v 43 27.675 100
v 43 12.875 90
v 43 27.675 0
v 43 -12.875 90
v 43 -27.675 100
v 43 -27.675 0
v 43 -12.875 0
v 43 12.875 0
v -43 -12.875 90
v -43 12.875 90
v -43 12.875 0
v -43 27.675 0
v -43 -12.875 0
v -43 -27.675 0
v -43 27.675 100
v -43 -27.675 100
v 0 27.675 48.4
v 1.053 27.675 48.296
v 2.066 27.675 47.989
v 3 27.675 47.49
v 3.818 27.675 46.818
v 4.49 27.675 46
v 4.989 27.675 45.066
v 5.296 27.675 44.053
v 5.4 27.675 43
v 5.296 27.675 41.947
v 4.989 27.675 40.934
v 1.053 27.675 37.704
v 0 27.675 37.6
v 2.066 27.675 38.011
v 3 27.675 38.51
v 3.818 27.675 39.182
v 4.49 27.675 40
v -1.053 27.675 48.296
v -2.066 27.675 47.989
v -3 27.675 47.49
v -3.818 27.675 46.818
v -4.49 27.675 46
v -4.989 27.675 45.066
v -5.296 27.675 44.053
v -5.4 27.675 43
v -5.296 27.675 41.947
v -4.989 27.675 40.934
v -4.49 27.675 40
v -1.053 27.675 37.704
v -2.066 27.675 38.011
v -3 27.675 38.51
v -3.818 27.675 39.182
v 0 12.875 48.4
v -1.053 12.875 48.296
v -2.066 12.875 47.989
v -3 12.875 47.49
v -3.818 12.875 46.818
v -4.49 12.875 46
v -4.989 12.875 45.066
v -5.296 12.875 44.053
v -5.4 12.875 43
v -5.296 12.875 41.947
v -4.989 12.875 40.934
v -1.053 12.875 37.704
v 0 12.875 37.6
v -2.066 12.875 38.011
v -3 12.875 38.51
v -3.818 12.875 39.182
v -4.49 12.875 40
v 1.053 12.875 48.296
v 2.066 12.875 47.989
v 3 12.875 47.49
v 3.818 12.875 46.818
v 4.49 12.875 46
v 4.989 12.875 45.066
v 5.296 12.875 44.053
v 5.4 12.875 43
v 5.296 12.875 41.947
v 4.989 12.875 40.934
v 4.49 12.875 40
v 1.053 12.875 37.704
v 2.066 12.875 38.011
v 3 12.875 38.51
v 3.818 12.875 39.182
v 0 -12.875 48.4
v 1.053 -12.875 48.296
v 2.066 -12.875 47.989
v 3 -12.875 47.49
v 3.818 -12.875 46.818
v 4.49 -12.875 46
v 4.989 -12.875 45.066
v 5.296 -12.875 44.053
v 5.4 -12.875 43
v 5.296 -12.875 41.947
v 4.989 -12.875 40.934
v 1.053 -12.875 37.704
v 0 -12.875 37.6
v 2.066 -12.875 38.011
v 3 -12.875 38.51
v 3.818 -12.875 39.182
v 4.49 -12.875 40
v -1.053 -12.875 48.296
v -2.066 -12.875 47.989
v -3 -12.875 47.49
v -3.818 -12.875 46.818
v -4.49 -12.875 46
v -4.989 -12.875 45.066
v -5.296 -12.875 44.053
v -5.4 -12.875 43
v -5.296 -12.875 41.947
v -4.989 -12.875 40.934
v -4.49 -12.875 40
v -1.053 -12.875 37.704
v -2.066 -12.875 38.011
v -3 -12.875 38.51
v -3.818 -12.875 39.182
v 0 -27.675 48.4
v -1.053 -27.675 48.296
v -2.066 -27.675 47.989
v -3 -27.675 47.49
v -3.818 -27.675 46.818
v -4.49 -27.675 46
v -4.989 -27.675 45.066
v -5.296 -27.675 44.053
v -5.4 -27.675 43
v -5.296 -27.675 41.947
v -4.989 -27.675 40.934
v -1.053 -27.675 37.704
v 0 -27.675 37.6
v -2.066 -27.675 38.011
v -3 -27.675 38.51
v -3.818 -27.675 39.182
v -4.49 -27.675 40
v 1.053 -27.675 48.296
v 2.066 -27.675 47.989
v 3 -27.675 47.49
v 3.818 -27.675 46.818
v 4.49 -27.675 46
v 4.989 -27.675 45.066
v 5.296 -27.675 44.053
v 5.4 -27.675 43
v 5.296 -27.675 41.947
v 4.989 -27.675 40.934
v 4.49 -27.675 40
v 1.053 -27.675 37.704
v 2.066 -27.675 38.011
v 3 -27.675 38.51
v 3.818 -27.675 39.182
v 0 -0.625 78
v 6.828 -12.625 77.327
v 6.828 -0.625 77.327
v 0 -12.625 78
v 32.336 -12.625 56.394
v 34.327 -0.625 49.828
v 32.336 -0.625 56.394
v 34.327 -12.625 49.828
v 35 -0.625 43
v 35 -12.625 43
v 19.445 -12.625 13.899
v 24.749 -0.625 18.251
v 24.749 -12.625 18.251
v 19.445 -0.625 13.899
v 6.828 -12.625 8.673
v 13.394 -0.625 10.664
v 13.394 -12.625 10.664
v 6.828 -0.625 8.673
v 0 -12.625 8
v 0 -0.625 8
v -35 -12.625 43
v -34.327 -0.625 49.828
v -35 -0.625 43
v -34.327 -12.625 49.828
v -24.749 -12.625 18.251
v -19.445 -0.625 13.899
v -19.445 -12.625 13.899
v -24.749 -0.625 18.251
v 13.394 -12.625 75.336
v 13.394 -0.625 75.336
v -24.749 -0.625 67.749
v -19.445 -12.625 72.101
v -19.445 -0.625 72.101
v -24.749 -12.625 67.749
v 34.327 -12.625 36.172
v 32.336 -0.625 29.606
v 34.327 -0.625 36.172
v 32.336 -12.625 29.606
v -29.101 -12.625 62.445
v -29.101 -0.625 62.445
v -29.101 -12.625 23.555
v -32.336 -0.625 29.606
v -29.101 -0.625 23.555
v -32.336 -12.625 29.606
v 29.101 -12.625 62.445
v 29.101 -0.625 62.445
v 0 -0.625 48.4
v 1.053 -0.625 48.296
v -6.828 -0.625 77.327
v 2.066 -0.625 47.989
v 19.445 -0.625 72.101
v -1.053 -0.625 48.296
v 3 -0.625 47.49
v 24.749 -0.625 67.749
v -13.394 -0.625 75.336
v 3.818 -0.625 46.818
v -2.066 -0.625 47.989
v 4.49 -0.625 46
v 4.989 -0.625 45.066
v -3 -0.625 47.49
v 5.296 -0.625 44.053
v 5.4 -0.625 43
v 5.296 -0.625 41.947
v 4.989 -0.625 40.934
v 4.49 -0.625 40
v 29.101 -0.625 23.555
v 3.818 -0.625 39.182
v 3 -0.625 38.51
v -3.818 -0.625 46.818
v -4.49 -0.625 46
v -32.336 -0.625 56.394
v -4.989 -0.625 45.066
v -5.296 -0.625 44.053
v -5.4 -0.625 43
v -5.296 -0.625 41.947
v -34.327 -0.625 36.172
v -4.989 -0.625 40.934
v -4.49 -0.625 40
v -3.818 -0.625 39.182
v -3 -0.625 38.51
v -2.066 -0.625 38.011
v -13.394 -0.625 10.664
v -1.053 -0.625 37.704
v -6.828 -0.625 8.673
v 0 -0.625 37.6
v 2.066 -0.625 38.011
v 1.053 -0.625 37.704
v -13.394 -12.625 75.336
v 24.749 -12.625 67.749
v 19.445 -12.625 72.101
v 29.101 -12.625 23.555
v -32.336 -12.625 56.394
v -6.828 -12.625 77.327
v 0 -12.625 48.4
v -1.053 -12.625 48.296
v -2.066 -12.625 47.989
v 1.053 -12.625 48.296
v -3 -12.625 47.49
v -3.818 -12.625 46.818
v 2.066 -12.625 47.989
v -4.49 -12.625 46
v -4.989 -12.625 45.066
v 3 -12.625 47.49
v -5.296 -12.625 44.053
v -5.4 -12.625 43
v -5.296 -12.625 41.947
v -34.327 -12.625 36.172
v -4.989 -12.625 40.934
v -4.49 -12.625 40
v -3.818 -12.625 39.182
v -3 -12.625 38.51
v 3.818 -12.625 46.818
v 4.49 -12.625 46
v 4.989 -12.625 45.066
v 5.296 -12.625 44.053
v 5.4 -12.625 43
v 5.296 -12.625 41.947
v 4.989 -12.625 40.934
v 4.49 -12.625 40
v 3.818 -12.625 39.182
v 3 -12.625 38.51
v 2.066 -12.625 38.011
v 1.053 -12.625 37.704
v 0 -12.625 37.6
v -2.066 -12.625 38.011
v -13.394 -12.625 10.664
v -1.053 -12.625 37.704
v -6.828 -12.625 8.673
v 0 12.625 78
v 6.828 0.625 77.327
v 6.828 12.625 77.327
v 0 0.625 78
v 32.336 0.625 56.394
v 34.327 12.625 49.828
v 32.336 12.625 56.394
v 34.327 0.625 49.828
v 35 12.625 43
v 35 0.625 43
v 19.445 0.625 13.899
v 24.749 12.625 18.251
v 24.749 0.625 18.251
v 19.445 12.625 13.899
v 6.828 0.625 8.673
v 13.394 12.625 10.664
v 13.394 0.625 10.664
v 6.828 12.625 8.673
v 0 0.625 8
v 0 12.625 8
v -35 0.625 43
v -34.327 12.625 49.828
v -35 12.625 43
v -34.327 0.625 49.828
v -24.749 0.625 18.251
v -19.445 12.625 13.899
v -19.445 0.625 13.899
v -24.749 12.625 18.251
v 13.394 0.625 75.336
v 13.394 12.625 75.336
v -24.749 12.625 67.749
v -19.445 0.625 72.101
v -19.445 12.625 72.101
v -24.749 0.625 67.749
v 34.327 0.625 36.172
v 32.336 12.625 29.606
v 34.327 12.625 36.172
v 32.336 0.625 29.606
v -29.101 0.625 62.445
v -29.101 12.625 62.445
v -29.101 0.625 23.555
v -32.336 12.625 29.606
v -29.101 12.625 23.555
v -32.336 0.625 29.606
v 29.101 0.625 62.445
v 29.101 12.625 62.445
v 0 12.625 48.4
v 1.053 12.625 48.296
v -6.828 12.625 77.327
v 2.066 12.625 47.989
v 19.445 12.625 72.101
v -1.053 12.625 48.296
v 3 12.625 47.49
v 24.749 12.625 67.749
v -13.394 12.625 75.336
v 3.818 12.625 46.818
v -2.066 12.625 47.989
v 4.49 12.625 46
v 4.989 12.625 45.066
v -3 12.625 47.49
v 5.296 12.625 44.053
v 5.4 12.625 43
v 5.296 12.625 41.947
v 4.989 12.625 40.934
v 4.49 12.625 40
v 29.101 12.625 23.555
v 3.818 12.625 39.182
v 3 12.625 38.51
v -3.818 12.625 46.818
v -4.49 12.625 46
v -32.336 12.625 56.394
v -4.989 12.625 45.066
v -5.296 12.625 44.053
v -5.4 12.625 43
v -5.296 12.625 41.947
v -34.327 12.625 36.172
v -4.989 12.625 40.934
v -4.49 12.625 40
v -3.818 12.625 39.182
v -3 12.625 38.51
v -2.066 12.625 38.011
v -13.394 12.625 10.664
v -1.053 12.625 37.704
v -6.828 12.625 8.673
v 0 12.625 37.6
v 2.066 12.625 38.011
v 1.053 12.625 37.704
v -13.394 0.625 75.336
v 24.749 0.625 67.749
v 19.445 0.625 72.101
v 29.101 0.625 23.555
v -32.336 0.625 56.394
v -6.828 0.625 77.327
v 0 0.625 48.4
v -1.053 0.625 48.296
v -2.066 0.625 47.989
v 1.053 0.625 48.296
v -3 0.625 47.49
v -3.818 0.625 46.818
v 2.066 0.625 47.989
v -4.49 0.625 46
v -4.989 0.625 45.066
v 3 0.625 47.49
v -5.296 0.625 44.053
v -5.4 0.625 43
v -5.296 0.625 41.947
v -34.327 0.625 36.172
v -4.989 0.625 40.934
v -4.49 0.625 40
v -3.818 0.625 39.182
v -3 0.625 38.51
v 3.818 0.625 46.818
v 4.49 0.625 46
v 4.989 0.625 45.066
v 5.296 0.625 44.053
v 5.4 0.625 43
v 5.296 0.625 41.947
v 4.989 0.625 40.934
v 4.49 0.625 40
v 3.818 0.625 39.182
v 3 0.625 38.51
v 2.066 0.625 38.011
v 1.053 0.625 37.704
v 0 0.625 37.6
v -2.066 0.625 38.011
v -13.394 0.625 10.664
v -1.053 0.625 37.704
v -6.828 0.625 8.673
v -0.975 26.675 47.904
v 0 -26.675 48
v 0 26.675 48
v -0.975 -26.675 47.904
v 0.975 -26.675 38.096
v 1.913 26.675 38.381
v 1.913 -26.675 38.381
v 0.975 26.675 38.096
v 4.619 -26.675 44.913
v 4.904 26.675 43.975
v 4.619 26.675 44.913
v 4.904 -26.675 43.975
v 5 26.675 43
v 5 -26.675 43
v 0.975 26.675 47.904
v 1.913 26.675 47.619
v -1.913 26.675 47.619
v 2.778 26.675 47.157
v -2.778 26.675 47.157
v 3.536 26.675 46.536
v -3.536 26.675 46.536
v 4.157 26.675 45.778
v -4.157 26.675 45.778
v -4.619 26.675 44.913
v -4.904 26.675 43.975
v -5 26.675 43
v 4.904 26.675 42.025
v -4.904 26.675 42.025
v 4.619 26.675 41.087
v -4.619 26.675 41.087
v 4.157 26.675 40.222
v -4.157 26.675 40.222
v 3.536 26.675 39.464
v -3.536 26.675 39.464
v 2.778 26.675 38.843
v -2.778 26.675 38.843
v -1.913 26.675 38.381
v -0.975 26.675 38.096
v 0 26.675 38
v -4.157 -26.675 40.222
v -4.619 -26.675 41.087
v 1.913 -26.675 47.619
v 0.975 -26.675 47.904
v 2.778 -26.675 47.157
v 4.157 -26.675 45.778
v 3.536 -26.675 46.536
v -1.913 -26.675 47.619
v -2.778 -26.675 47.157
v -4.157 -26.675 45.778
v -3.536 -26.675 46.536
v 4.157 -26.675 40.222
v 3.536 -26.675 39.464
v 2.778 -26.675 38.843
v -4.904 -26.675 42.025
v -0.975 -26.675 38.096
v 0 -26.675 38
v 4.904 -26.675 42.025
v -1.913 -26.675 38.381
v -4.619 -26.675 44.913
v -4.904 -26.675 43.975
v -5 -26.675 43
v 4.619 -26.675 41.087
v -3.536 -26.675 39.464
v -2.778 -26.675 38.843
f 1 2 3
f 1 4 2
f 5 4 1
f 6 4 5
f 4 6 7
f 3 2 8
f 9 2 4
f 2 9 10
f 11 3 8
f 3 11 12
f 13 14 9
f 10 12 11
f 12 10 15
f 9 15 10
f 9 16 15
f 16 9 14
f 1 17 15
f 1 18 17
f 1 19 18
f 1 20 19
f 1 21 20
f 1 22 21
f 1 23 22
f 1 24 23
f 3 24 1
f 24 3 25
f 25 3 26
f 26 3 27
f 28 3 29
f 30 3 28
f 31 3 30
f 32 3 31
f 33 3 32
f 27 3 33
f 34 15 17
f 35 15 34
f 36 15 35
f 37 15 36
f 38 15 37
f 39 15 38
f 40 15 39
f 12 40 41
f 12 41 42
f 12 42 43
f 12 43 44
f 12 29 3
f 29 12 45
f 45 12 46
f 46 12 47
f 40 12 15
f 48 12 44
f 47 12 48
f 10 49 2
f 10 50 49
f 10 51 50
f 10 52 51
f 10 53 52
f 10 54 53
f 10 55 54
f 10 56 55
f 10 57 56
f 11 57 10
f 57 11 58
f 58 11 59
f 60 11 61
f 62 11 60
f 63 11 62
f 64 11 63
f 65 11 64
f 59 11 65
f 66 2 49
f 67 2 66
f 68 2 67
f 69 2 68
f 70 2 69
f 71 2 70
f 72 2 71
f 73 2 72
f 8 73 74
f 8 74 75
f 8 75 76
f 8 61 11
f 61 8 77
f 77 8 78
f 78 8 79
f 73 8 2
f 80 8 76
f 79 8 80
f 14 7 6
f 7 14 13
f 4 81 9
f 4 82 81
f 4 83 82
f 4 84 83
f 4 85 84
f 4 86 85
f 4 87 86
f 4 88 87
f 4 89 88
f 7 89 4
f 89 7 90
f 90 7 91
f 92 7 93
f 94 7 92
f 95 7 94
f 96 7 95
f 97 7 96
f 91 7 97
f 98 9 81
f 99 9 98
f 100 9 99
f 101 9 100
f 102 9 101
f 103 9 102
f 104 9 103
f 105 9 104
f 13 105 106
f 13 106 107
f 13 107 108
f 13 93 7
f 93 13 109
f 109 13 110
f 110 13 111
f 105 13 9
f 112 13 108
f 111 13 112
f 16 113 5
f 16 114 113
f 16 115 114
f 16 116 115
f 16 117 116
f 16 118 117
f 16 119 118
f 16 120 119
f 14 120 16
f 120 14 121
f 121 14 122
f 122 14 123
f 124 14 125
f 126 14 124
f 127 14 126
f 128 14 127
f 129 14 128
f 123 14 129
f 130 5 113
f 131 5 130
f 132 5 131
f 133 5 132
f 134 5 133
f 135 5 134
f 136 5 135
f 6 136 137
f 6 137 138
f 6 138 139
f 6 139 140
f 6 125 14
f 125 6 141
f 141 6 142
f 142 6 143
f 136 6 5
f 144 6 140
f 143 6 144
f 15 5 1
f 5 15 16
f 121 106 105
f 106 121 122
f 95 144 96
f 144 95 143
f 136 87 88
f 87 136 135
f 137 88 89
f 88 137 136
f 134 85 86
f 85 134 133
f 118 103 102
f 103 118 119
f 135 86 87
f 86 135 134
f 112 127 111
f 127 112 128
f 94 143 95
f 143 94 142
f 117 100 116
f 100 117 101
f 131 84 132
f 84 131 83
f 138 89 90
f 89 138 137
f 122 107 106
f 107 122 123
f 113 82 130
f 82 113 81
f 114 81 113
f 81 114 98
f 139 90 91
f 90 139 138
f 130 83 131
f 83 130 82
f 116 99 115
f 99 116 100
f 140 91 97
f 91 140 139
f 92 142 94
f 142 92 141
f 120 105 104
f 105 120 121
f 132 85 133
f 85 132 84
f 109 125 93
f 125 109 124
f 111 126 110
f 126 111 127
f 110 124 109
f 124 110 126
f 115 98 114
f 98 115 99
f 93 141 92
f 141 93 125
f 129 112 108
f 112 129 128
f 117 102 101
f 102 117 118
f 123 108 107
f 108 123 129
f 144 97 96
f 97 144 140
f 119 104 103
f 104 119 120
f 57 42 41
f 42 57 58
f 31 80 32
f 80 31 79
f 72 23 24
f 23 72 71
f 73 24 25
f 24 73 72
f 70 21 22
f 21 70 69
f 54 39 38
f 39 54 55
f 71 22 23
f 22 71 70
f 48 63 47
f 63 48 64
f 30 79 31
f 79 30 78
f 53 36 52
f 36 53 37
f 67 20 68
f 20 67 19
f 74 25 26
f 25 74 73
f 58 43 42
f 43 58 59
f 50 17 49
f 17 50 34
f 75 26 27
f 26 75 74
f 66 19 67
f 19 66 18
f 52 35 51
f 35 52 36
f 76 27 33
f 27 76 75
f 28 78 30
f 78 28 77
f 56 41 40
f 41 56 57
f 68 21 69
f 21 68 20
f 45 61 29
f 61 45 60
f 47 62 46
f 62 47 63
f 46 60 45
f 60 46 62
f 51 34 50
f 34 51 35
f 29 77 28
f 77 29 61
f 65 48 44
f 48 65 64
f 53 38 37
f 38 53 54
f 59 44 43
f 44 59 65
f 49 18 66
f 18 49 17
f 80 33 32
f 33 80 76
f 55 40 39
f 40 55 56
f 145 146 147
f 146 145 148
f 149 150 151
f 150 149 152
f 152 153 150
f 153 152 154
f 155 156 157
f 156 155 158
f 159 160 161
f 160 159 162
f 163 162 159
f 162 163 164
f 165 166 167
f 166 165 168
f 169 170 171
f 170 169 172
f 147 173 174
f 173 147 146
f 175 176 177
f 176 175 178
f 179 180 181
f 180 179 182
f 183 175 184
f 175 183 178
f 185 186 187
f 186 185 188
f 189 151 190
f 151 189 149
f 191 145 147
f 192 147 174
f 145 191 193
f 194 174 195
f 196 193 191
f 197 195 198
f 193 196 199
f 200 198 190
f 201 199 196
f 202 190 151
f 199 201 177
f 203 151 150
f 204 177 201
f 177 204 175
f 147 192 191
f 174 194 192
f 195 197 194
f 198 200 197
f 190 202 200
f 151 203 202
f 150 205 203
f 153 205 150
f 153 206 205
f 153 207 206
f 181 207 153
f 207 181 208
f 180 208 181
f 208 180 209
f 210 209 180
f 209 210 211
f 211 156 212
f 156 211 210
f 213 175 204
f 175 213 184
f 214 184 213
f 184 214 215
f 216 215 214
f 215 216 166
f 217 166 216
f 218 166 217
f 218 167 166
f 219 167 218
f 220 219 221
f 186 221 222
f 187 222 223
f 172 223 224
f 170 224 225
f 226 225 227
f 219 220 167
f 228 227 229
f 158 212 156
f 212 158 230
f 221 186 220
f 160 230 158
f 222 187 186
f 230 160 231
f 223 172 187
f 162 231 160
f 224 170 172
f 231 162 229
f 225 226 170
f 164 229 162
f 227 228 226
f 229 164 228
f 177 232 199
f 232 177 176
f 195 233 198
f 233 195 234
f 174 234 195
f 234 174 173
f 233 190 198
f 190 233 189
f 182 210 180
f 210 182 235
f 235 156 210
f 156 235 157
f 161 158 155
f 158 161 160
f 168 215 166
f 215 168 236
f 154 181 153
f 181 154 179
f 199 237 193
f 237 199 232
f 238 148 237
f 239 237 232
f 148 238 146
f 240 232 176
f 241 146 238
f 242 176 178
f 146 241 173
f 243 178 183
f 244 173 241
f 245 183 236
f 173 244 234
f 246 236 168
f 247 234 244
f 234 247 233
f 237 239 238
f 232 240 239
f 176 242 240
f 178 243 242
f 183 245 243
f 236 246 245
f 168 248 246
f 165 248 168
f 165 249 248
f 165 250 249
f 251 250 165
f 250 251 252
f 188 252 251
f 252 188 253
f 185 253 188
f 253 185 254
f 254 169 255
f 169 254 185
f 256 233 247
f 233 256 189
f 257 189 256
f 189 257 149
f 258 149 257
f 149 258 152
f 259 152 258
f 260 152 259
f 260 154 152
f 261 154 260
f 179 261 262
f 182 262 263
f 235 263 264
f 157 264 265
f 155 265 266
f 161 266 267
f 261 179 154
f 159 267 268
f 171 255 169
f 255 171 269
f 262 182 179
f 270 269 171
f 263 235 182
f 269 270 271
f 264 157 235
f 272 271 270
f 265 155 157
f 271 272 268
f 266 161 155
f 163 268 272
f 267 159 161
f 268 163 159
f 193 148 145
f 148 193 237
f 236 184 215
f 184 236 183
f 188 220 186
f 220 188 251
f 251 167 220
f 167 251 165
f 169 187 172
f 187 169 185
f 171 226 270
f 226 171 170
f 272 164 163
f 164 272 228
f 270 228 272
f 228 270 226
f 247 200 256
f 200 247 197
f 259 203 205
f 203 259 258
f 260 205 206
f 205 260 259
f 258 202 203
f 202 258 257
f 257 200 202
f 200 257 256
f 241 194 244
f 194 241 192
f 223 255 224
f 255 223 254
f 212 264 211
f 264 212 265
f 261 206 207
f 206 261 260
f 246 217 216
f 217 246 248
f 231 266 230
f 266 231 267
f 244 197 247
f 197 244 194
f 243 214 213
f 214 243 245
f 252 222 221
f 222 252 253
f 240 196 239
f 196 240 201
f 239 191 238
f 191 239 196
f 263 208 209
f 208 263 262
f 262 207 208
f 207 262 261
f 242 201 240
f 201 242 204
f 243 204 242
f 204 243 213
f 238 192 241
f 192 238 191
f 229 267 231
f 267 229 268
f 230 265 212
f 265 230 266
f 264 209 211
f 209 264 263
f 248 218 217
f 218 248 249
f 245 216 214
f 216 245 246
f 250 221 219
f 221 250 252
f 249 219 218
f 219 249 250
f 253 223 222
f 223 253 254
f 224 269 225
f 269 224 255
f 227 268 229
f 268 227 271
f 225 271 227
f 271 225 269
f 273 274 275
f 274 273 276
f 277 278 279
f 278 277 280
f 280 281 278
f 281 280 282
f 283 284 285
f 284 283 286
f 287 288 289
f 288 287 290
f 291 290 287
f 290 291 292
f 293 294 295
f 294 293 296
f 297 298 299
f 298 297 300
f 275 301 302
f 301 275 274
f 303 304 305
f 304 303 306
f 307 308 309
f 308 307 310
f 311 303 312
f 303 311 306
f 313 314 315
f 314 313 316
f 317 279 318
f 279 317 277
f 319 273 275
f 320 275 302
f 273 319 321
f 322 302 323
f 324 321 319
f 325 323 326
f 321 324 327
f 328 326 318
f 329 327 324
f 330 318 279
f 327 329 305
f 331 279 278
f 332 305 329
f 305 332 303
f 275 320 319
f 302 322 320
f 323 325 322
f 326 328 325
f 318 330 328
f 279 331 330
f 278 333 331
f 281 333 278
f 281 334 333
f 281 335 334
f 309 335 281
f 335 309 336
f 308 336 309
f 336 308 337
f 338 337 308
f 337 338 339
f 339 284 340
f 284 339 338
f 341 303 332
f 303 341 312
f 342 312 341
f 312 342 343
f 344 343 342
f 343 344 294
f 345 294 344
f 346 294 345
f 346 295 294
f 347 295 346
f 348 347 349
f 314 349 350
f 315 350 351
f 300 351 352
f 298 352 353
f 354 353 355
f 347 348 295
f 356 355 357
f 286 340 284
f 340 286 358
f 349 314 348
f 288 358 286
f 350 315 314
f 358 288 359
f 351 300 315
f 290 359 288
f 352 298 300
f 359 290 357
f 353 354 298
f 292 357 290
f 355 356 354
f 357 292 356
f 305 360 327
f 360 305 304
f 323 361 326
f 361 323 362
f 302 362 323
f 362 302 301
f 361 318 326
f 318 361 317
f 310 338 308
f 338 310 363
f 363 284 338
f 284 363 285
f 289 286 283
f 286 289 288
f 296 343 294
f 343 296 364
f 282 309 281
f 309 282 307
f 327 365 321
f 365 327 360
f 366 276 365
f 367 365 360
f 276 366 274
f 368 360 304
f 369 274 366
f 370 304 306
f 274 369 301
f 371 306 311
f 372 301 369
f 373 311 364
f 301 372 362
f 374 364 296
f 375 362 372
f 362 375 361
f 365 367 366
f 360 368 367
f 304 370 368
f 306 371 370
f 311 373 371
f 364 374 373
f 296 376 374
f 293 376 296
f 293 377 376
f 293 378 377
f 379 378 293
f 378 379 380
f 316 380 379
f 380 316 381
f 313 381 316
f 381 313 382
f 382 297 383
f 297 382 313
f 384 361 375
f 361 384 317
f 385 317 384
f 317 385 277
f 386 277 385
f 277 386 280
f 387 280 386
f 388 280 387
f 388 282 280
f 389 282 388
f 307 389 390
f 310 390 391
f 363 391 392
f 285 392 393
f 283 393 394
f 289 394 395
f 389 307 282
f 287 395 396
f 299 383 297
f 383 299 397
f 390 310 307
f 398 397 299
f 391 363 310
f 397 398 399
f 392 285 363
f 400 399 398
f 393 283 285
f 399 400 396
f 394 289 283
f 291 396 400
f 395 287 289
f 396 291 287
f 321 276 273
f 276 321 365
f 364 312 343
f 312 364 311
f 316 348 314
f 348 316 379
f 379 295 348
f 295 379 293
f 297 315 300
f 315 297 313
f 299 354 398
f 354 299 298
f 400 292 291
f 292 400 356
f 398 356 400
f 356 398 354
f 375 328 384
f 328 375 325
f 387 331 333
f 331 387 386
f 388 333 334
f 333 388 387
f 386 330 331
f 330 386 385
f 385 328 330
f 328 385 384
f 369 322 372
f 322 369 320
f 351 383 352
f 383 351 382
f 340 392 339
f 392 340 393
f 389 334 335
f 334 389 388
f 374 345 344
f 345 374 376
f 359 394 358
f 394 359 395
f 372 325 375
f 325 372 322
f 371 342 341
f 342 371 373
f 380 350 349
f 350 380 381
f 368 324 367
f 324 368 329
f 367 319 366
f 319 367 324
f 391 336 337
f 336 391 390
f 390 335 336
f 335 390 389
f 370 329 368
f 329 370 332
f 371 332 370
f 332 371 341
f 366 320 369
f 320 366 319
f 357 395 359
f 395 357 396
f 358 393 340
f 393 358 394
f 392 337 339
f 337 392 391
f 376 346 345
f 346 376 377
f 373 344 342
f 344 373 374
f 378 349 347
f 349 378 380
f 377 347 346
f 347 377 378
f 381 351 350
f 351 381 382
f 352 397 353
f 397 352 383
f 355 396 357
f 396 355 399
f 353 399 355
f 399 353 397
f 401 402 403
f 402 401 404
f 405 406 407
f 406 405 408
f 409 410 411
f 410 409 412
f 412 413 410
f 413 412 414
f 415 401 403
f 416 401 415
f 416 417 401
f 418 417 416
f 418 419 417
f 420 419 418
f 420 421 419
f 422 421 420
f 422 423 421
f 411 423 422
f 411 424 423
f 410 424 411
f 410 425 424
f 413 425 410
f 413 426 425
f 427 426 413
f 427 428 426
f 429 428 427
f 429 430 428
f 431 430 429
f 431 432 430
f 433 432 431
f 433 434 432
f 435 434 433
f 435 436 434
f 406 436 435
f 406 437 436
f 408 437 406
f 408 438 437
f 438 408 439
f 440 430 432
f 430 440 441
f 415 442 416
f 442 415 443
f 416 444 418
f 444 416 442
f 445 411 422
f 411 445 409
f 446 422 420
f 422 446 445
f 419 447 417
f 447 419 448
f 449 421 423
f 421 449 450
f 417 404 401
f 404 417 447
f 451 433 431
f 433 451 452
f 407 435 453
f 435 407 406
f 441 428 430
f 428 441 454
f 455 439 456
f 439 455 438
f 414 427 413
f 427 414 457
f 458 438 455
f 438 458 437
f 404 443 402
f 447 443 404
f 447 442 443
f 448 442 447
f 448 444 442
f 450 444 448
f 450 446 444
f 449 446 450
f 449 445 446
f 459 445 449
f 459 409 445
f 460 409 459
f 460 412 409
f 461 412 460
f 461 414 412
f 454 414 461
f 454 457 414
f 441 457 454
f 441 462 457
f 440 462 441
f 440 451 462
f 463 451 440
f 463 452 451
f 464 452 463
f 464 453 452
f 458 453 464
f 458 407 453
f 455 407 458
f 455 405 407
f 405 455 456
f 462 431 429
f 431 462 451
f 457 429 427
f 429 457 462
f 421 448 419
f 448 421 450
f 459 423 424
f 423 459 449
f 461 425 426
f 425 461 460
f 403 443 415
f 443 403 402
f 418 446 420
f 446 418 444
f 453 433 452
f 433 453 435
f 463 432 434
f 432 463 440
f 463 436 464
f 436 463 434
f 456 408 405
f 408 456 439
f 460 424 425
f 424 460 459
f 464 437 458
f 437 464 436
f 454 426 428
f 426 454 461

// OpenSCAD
$fn = 32;

// ------------------------------------------------------------------------
// Trolley wheel set: wheels d70, fork 90 mm tall
// Every part is its own module, assembly() places every instance.
// ------------------------------------------------------------------------

// --- part 1 ---
module trolley_fork() {
  difference() {
    union() {
      translate([-43, 12.875, 0]) cube([86, 14.8, 90]);
      translate([-43, -27.675, 0]) cube([86, 14.8, 90]);
      translate([-43, -27.675, 90]) cube([86, 55.35, 10]);
    }
    translate([0, -20.275, 43]) rotate([90, 0, 0]) cylinder(h = 16.8, d = 10.8, center = true);
    translate([0, 20.275, 43]) rotate([90, 0, 0]) cylinder(h = 16.8, d = 10.8, center = true);
  }
}

// --- part 2 ---
module trolley_wheel() {
  difference() {
      translate([0, 0, 0]) cylinder(h = 12, d = 70);
      translate([0, 0, -1]) cylinder(h = 14, d = 10.8);
    }
}

// --- part 3 ---
module trolley_axle() {
  translate([0, 0, -26.675]) cylinder(h = 53.35, d = 10);
}

// --- assembly ---
module assembly() {
  color([0.80, 0.24, 0.20]) translate([0, 0, 0]) rotate([0, 0, 0]) trolley_fork();
  color([0.20, 0.45, 0.75]) translate([0, -0.625, 43]) rotate([90, 0, 0]) trolley_wheel();
  color([0.25, 0.62, 0.32]) translate([0, 12.625, 43]) rotate([90, 0, 0]) trolley_wheel();
  color([0.92, 0.70, 0.18]) translate([0, 0, 43]) rotate([90, 0, 0]) trolley_axle();
}

assembly();
